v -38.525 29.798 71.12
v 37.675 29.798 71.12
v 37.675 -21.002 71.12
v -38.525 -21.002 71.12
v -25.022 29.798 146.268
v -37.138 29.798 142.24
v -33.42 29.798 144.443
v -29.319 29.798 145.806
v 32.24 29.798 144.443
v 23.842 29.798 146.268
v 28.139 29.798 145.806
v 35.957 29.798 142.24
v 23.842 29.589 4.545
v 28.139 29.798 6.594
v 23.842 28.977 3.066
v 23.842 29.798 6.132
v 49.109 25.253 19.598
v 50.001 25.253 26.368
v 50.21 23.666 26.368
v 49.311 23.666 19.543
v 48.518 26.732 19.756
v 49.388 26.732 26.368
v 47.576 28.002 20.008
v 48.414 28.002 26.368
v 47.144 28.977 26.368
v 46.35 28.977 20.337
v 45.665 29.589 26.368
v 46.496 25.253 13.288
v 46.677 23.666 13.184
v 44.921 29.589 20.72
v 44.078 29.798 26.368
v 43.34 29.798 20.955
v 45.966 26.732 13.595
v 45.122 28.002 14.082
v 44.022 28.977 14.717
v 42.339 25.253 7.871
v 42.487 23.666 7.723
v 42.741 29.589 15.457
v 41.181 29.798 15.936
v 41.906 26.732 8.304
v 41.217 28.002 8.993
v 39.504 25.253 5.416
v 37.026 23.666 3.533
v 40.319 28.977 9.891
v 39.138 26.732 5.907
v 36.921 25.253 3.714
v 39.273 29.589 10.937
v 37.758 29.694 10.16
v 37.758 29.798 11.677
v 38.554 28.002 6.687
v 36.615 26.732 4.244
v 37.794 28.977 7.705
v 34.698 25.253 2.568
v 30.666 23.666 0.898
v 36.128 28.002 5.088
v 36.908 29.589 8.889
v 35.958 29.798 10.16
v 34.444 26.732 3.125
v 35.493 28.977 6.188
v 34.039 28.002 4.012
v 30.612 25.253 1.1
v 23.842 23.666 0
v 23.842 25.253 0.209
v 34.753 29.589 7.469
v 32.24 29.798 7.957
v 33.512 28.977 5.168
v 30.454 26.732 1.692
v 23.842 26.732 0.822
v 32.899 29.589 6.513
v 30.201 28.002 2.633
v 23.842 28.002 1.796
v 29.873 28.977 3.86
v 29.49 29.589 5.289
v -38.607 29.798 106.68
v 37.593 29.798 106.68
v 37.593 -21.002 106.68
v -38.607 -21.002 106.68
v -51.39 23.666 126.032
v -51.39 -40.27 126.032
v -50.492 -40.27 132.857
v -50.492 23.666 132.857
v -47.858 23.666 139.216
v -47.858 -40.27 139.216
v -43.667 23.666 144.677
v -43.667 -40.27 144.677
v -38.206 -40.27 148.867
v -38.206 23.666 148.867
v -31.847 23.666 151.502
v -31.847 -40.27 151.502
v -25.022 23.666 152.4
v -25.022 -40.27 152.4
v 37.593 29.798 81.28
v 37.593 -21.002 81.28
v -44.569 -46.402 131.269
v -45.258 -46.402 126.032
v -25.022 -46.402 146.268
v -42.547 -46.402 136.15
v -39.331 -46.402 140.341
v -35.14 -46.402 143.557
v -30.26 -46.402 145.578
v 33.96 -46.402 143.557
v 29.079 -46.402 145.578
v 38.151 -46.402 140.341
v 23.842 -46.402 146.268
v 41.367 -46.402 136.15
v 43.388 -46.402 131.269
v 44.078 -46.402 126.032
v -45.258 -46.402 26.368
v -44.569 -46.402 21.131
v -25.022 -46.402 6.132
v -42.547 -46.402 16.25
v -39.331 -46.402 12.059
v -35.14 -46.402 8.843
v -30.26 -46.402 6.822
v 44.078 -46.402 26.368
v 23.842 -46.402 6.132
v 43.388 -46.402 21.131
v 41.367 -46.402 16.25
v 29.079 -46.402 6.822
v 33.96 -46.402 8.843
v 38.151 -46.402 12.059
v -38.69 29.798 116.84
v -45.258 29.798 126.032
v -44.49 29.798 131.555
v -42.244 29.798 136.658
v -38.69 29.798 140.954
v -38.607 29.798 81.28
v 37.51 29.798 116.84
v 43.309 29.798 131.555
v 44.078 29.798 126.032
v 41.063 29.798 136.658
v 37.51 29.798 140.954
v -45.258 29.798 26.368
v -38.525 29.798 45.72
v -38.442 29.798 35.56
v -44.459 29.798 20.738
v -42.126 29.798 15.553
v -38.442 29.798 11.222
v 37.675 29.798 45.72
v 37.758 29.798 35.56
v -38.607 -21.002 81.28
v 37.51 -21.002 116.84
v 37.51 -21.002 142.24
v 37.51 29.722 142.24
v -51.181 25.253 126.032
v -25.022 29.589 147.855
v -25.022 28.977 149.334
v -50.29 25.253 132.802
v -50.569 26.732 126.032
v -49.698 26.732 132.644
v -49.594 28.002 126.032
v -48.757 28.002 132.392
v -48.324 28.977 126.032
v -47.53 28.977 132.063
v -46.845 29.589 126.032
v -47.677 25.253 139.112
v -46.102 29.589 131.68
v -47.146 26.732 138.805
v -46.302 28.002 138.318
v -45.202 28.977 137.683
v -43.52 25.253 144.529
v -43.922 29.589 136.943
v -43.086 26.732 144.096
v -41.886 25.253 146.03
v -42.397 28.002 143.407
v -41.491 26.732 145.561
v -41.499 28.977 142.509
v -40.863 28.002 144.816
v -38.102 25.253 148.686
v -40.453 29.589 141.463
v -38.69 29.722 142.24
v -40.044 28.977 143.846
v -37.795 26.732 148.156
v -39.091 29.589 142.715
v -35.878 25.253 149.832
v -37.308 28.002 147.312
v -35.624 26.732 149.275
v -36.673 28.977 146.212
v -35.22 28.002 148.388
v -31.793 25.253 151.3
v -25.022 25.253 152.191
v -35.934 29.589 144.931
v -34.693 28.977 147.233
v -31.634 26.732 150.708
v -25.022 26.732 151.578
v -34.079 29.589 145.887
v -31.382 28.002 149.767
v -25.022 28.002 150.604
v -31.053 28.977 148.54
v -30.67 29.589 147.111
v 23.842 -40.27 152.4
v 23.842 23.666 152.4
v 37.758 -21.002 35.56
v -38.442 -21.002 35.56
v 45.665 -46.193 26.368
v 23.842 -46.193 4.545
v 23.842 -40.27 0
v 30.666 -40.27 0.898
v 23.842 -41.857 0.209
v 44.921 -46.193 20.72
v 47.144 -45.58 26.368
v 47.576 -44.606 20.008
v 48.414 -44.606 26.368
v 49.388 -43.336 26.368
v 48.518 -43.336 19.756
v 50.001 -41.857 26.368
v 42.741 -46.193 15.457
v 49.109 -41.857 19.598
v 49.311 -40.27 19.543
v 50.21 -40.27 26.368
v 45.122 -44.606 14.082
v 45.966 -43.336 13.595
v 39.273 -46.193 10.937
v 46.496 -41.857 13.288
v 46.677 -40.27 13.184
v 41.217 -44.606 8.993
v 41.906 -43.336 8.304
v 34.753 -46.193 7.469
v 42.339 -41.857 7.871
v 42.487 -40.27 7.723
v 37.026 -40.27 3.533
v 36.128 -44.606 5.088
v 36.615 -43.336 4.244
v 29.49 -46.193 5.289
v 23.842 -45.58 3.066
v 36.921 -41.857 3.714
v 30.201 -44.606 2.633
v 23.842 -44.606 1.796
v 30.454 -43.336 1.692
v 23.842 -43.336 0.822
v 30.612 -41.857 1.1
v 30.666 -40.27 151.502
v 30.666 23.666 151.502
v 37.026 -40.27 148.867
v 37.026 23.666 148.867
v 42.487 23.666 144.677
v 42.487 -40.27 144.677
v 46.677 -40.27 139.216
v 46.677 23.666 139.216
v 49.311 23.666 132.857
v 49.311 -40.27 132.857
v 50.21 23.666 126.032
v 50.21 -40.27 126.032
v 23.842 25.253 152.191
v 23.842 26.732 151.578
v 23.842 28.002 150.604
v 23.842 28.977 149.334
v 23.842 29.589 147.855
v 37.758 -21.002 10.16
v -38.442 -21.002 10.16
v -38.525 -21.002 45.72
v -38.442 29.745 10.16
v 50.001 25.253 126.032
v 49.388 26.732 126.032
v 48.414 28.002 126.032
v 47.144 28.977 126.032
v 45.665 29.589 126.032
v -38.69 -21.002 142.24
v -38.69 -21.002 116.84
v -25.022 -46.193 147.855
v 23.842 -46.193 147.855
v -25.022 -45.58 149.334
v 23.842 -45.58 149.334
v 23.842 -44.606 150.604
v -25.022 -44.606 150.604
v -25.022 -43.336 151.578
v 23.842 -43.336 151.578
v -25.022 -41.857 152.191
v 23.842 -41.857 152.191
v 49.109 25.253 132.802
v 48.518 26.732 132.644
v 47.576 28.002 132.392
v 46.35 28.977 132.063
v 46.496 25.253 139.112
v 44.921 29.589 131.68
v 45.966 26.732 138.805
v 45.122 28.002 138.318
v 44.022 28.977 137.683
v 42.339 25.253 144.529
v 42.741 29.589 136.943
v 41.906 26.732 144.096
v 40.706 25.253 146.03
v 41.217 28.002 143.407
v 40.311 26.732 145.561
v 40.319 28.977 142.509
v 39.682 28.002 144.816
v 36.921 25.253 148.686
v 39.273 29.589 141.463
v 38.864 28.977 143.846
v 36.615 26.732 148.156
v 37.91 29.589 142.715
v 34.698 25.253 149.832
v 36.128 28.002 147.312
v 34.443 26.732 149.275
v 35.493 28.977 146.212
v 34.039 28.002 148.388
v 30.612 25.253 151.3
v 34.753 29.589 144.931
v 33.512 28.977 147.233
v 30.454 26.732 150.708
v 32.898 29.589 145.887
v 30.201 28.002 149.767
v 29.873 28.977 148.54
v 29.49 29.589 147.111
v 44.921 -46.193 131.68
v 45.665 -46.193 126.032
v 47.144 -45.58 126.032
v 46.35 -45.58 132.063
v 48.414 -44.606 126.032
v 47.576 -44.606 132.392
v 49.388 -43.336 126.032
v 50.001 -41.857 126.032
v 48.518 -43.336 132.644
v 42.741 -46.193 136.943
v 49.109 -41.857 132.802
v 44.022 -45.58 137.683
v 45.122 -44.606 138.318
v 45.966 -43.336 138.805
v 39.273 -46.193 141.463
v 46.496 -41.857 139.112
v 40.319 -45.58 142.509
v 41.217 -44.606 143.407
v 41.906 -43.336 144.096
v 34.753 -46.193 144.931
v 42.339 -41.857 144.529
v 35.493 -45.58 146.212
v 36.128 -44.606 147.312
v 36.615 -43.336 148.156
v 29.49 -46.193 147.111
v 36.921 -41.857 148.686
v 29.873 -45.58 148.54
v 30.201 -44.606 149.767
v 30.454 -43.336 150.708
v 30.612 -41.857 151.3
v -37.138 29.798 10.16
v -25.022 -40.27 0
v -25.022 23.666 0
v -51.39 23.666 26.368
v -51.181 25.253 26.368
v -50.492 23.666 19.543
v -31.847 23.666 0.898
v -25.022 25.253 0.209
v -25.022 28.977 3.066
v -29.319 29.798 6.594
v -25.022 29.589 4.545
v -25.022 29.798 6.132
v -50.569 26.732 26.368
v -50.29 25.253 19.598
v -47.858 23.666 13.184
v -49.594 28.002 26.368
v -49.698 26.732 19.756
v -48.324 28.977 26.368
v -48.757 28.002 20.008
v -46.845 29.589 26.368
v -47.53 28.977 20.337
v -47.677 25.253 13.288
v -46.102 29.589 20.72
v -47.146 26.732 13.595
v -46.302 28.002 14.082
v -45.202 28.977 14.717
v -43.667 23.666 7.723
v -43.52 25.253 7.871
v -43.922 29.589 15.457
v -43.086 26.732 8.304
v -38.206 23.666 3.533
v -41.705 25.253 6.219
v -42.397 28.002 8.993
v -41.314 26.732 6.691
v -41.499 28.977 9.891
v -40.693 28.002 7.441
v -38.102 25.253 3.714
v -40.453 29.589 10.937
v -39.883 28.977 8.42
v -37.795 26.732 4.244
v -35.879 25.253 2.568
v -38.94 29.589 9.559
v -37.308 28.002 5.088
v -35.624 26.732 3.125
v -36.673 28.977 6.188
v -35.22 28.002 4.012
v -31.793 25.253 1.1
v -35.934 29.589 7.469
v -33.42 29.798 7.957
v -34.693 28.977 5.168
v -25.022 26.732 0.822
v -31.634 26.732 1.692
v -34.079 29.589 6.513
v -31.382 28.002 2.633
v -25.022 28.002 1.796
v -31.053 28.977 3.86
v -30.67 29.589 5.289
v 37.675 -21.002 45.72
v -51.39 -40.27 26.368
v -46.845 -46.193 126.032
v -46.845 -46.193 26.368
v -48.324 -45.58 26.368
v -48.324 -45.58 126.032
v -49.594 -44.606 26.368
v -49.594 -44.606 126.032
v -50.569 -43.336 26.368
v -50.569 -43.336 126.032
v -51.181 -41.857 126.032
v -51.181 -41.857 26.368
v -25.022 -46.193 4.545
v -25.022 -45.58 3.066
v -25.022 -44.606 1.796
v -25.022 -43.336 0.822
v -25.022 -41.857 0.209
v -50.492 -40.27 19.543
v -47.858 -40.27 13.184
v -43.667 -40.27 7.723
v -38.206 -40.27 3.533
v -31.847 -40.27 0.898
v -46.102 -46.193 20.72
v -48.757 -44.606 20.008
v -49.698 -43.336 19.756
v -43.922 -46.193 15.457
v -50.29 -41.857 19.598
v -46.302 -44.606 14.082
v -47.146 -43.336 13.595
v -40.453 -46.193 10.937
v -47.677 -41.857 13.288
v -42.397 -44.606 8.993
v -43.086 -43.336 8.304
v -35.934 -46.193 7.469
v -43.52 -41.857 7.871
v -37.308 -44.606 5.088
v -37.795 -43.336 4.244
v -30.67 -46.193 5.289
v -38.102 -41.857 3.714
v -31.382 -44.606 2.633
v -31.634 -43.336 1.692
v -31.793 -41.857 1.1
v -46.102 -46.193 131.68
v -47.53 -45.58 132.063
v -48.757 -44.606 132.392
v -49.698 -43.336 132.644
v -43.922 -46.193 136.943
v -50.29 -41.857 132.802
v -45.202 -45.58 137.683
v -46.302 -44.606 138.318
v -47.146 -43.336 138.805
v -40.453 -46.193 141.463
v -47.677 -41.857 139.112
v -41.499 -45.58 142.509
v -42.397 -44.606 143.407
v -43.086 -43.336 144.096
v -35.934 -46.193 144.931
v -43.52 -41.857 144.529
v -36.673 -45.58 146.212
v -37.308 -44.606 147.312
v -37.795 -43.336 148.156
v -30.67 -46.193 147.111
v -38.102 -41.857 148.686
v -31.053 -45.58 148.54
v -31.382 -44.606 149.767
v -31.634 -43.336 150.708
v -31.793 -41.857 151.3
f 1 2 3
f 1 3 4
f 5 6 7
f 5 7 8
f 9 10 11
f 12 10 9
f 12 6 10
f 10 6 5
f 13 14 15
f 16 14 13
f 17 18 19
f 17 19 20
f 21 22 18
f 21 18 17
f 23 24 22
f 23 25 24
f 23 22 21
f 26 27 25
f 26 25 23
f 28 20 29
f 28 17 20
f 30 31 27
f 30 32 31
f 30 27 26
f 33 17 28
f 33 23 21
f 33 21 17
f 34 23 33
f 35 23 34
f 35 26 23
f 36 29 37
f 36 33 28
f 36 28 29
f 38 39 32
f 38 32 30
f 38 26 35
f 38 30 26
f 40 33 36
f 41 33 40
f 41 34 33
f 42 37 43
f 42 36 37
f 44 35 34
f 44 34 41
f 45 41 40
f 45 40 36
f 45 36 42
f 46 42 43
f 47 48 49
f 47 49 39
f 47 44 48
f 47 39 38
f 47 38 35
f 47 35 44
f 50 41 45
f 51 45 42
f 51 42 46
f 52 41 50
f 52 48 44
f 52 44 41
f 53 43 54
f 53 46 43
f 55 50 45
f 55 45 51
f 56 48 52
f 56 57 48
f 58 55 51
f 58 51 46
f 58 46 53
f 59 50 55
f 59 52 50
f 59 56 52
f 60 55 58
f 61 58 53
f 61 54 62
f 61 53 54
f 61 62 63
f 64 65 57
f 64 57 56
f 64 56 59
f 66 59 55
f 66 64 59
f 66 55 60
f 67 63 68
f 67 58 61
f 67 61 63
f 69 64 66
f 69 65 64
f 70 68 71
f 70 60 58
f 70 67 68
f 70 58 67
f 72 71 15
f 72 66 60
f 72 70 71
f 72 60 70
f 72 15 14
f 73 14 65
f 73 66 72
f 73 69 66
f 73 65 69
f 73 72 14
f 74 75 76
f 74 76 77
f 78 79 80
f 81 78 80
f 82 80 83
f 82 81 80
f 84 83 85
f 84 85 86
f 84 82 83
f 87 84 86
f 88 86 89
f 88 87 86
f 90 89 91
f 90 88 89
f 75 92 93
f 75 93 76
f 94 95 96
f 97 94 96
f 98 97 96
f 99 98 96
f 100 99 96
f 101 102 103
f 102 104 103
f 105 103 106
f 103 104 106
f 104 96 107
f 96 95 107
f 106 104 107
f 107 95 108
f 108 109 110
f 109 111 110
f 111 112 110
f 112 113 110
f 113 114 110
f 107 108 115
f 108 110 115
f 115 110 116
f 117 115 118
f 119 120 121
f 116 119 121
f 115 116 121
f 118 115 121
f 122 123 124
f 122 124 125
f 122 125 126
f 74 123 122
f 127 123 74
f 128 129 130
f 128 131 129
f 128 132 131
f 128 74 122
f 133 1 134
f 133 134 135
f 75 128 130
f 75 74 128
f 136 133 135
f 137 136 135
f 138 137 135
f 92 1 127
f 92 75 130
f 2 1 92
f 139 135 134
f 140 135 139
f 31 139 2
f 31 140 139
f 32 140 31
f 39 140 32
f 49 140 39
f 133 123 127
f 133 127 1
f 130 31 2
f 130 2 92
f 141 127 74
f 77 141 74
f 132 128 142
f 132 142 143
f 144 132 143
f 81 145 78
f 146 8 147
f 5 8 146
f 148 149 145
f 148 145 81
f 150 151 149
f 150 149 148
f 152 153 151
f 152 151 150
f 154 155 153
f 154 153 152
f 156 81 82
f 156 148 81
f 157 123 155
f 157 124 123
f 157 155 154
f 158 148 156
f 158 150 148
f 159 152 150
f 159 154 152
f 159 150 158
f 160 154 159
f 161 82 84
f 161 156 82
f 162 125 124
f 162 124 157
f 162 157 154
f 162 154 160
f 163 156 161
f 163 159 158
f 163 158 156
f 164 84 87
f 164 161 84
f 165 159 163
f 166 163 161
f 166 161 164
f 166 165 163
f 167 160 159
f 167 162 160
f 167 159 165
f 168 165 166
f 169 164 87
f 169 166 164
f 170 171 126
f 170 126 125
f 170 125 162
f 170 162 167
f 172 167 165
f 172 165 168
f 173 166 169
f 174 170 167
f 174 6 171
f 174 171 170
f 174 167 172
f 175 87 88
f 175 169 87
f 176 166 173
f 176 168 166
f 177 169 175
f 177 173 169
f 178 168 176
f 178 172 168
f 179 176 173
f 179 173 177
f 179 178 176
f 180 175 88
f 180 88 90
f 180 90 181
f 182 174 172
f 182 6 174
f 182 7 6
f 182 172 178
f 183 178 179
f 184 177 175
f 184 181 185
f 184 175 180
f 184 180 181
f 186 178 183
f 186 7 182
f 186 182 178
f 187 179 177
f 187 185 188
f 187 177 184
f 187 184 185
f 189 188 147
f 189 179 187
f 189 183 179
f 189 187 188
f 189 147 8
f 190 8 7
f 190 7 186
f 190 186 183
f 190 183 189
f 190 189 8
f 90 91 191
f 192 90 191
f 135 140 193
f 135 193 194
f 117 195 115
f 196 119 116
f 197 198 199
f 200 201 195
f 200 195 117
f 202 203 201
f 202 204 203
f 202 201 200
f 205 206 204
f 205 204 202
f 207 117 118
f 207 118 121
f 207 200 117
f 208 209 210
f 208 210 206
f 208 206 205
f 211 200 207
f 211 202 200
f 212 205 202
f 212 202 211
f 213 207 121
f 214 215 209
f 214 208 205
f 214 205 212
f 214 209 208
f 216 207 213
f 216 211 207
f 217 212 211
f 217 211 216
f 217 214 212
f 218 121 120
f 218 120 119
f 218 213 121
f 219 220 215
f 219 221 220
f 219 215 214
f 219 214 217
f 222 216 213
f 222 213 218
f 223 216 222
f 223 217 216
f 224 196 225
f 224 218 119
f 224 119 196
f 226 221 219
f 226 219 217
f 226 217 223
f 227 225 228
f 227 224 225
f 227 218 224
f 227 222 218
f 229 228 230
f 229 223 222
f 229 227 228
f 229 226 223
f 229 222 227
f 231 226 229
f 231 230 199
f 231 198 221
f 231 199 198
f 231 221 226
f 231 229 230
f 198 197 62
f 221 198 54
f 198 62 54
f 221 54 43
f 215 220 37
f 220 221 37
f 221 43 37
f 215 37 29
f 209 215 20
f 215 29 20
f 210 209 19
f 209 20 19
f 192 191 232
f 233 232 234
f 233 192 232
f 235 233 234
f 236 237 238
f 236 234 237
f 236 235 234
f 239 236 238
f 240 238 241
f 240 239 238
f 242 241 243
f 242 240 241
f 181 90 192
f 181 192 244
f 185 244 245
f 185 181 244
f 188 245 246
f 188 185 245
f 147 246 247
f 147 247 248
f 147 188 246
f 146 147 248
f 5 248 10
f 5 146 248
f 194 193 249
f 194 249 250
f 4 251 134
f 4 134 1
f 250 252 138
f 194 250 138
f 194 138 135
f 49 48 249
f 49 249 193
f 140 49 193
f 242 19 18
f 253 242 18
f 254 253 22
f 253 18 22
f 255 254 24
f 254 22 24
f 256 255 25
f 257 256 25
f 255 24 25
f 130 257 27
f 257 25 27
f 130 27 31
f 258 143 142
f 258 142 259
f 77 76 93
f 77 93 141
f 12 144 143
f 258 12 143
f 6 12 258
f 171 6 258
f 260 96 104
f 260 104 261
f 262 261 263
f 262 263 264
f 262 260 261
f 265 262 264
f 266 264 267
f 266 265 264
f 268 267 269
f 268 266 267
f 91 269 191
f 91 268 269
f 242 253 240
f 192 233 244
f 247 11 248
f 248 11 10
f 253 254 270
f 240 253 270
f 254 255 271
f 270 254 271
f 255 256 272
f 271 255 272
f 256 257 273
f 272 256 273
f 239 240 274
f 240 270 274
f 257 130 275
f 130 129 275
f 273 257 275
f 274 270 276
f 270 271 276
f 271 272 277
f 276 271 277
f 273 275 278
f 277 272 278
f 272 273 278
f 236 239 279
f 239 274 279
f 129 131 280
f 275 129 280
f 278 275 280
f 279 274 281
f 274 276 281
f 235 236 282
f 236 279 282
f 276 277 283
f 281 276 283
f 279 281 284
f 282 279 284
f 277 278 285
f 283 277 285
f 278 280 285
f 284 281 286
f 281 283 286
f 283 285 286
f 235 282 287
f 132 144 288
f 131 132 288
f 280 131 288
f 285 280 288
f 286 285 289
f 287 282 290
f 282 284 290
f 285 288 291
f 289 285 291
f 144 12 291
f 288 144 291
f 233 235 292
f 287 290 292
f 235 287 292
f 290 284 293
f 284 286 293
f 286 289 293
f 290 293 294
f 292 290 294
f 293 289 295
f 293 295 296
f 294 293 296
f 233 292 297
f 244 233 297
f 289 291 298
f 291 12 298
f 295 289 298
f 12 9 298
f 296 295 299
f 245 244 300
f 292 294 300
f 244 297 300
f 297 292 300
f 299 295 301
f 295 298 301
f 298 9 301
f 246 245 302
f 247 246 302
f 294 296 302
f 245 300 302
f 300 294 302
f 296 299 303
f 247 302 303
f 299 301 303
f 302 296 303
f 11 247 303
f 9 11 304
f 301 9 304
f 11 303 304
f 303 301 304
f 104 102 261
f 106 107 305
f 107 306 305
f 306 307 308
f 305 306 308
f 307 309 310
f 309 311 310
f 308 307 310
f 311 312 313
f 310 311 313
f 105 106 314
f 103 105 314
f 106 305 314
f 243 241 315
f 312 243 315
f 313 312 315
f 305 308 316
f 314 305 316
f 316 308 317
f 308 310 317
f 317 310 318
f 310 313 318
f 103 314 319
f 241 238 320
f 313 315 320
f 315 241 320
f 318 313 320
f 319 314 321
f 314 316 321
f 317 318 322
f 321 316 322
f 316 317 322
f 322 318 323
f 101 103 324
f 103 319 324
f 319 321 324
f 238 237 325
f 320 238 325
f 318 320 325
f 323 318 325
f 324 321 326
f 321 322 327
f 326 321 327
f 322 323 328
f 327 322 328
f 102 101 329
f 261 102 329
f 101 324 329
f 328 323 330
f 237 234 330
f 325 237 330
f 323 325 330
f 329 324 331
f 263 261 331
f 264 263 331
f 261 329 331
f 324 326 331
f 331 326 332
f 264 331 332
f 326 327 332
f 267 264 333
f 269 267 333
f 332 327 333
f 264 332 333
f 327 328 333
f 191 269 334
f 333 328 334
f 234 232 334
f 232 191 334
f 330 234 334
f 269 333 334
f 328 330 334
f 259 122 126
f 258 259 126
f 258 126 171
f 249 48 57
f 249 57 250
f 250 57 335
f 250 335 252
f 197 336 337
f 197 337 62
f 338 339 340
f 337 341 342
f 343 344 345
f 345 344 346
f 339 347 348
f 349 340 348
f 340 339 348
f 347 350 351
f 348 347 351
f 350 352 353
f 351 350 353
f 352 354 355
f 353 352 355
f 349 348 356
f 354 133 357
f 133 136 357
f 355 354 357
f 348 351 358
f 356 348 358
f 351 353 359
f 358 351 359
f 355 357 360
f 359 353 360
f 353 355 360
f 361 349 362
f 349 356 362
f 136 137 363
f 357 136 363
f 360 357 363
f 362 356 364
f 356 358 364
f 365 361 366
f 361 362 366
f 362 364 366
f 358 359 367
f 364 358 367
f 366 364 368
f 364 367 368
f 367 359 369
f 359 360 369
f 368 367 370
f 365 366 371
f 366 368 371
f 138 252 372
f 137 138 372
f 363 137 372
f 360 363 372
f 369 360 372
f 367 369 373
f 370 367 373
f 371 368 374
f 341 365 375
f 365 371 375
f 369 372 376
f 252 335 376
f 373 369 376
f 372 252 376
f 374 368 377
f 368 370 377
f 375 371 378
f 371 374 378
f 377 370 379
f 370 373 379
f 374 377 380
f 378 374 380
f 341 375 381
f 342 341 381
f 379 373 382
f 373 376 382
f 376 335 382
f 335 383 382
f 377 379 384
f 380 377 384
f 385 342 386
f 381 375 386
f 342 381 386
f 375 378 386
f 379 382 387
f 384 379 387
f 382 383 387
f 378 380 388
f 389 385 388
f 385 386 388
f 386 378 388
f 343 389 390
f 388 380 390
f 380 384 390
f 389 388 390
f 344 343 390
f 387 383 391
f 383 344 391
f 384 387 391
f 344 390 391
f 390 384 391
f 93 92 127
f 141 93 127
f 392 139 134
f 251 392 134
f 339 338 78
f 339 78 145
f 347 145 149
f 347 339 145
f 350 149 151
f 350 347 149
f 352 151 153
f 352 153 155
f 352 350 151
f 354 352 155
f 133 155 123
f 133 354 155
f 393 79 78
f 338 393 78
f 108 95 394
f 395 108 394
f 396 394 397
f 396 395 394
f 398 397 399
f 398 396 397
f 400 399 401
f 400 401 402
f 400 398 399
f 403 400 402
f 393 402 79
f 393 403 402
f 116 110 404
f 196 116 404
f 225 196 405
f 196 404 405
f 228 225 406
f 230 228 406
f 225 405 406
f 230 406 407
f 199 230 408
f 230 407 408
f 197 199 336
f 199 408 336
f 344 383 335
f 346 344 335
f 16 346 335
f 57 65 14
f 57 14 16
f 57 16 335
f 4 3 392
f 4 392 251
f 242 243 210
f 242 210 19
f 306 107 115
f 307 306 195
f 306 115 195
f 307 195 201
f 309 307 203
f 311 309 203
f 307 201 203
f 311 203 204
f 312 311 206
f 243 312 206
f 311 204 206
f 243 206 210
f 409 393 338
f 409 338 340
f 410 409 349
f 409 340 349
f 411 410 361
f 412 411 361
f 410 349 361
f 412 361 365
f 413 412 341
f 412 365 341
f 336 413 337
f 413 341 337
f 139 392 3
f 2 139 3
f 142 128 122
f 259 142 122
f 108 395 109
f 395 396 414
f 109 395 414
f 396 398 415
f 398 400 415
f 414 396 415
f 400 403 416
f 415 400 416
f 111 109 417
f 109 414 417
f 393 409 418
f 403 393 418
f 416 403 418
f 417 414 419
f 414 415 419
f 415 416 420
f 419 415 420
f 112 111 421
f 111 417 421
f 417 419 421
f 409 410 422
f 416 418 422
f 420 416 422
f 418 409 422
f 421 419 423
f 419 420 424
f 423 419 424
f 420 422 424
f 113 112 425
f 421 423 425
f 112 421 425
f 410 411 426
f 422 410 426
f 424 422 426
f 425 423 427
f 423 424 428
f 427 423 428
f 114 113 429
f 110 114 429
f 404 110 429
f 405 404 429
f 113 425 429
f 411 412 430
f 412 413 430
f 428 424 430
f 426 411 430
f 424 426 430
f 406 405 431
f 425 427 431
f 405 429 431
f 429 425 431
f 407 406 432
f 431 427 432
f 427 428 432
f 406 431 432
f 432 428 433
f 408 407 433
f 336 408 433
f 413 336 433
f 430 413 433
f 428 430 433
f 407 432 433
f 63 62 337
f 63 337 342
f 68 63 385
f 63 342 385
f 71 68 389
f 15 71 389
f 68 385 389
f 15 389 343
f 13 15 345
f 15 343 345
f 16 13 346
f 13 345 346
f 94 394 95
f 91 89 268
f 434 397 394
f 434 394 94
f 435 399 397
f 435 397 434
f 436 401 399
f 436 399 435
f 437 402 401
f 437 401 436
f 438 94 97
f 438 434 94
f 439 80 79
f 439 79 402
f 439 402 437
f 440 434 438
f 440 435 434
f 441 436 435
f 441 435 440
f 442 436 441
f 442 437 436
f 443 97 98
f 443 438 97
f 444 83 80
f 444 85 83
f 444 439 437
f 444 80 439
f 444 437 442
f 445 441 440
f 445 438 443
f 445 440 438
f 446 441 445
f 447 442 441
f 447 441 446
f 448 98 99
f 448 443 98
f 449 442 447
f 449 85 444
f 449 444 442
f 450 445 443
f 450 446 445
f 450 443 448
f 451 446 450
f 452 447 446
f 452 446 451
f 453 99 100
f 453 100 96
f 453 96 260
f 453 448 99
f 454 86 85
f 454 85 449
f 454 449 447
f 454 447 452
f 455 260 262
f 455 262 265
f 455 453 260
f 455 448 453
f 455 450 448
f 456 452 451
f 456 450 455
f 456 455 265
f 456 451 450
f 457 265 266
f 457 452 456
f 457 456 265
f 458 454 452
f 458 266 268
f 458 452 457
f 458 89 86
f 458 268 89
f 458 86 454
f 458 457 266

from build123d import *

# Parameters (mm, degrees)
F0_W         = 101.6
F0_H         = 76.2
F1_DEPTH     = 152.4
F2_W         = 76.2
F2_H         = 25.4
F3_DEPTH     = 50.8
F4_R         = 26.3680405282
F5_T1_DEPTH  = 48.8639189435
F5_T3_DEPTH  = 99.6639189435
F5_T6_ANGLE  = 90
F5_T8_ANGLE  = 90
F5_T10_ANGLE = 90
F5_T12_ANGLE = 90
F5_T14_ANGLE = 90
F5_T16_ANGLE = 90
F5_T18_ANGLE = 90
F5_T20_ANGLE = 90


# Not quite as in the source:
# - a fillet or chamfer that OpenCascade refuses, or shapes differently, is made with other operations: its cross-section is extruded or revolved along the edge and cut away or added


with BuildPart() as f1:
    # F0 (on Top) → F1 (new body)
    with BuildSketch(Plane.XY):
        with Locations((-0.5902759731, -8.3016921655)):
            Rectangle(F0_W, F0_H)
    extrude(amount=F1_DEPTH)

    # F2 (on face) → F3 (cut)
    with BuildSketch(Plane(origin=(0, 29.7983078345, 0), x_dir=(-1, 0, 0), z_dir=(0, 1, 0))):
        with Locations((0.5902759731, 129.54)):
            Rectangle(F2_W, F2_H)
        with Locations((0.5074083115, 93.9800965559)):
            Rectangle(F2_W, F2_H)
        with Locations((0.42454065, 58.4201931119)):
            Rectangle(F2_W, F2_H)
        with Locations((0.3416729884, 22.8602896678)):
            Rectangle(F2_W, F2_H)
    extrude(amount=-F3_DEPTH, mode=Mode.SUBTRACT)

    # F4
    f4_edges = [f1.edges().sort_by_distance(p)[0] for p in [
        (-51.390276, -8.301692, 152.4),
        (50.209724, -8.301692, 152.4),
        (-51.390276, -8.301692, 0),
        (50.209724, -8.301692, 0),
    ]]
    fillet(f4_edges, radius=F4_R)

    # F5: fillet of radius 6.1321024484 on 16 edges, made by hand

    # F5_s2 → F5_t1 (cut)
    with BuildSketch(Plane.YZ.offset(-25.0222354448)):
        with BuildLine():
            ThreePointArc((23.6662053861, 152.4), (28.0022566103, 150.6039487758), (29.7983078345, 146.2678975516))
            Line((29.7983078345, 146.2678975516), (29.7983078345, 152.4))
            Line((29.7983078345, 152.4), (23.6662053861, 152.4))
        make_face()
        with BuildLine():
            ThreePointArc((-46.4016921655, 146.2678975516), (-44.6056409413, 150.6039487758), (-40.2695897171, 152.4))
            Line((-40.2695897171, 152.4), (-46.4016921655, 152.4))
            Line((-46.4016921655, 152.4), (-46.4016921655, 146.2678975516))
        make_face()
        with BuildLine():
            ThreePointArc((23.6662053861, 0), (28.0022566103, 1.7960512242), (29.7983078345, 6.1321024484))
            Line((29.7983078345, 6.1321024484), (29.7983078345, 0))
            Line((29.7983078345, 0), (23.6662053861, 0))
        make_face()
        with BuildLine():
            ThreePointArc((-46.4016921655, 6.1321024484), (-44.6056409413, 1.7960512242), (-40.2695897171, 0))
            Line((-40.2695897171, 0), (-46.4016921655, 0))
            Line((-46.4016921655, 0), (-46.4016921655, 6.1321024484))
        make_face()
    extrude(amount=F5_T1_DEPTH, mode=Mode.SUBTRACT)

    # F5_s4 → F5_t3 (cut)
    with BuildSketch(Plane.XY.offset(26.3680405282)):
        with BuildLine():
            ThreePointArc((-45.2581735247, -46.4016921655), (-49.5942247489, -44.6056409413), (-51.3902759731, -40.2695897171))
            Line((-51.3902759731, -40.2695897171), (-51.3902759731, -46.4016921655))
            Line((-51.3902759731, -46.4016921655), (-45.2581735247, -46.4016921655))
        make_face()
        with BuildLine():
            ThreePointArc((44.0776215785, -46.4016921655), (48.4136728027, -44.6056409413), (50.2097240269, -40.2695897171))
            Line((50.2097240269, -40.2695897171), (50.2097240269, -46.4016921655))
            Line((50.2097240269, -46.4016921655), (44.0776215785, -46.4016921655))
        make_face()
        with BuildLine():
            ThreePointArc((-51.3902759731, 23.6662053861), (-49.5942247489, 28.0022566103), (-45.2581735247, 29.7983078345))
            Line((-45.2581735247, 29.7983078345), (-51.3902759731, 29.7983078345))
            Line((-51.3902759731, 29.7983078345), (-51.3902759731, 23.6662053861))
        make_face()
        with BuildLine():
            ThreePointArc((50.2097240269, 23.6662053861), (48.4136728027, 28.0022566103), (44.0776215785, 29.7983078345))
            Line((44.0776215785, 29.7983078345), (50.2097240269, 29.7983078345))
            Line((50.2097240269, 29.7983078345), (50.2097240269, 23.6662053861))
        make_face()
    extrude(amount=F5_T3_DEPTH, mode=Mode.SUBTRACT)

    # F5_s5 → F5_t6 (revolve, cut)
    with BuildSketch(Plane.XY.offset(26.3680405282)):
        with BuildLine():
            ThreePointArc((-45.2581735247, -46.4016921655), (-49.5942247489, -44.6056409413), (-51.3902759731, -40.2695897171))
            Line((-51.3902759731, -40.2695897171), (-51.3902759731, -46.4016921655))
            Line((-51.3902759731, -46.4016921655), (-45.2581735247, -46.4016921655))
        make_face()
    revolve(axis=Axis((-25.0222354448, -46.4016921655, 26.3680405282), (0, -1, 0)), revolution_arc=F5_T6_ANGLE, mode=Mode.SUBTRACT)

    # F5_s7 → F5_t8 (revolve, cut)
    with BuildSketch(Plane.XY.offset(126.0319594718)):
        with BuildLine():
            ThreePointArc((-45.2581735247, -46.4016921655), (-49.5942247489, -44.6056409413), (-51.3902759731, -40.2695897171))
            Line((-51.3902759731, -40.2695897171), (-51.3902759731, -46.4016921655))
            Line((-51.3902759731, -46.4016921655), (-45.2581735247, -46.4016921655))
        make_face()
    revolve(axis=Axis((-25.0222354448, -46.4016921655, 126.0319594718), (0, 1, 0)), revolution_arc=F5_T8_ANGLE, mode=Mode.SUBTRACT)

    # F5_s9 → F5_t10 (revolve, cut)
    with BuildSketch(Plane.XY.offset(26.3680405282)):
        with BuildLine():
            ThreePointArc((44.0776215785, -46.4016921655), (48.4136728027, -44.6056409413), (50.2097240269, -40.2695897171))
            Line((50.2097240269, -40.2695897171), (50.2097240269, -46.4016921655))
            Line((50.2097240269, -46.4016921655), (44.0776215785, -46.4016921655))
        make_face()
    revolve(axis=Axis((23.8416834987, -46.4016921655, 26.3680405282), (0, 1, 0)), revolution_arc=F5_T10_ANGLE, mode=Mode.SUBTRACT)

    # F5_s11 → F5_t12 (revolve, cut)
    with BuildSketch(Plane.XY.offset(126.0319594718)):
        with BuildLine():
            ThreePointArc((44.0776215785, -46.4016921655), (48.4136728027, -44.6056409413), (50.2097240269, -40.2695897171))
            Line((50.2097240269, -40.2695897171), (50.2097240269, -46.4016921655))
            Line((50.2097240269, -46.4016921655), (44.0776215785, -46.4016921655))
        make_face()
    revolve(axis=Axis((23.8416834987, -46.4016921655, 126.0319594718), (0, -1, 0)), revolution_arc=F5_T12_ANGLE, mode=Mode.SUBTRACT)

    # F5_s13 → F5_t14 (revolve, cut)
    with BuildSketch(Plane.XY.offset(26.3680405282)):
        with BuildLine():
            ThreePointArc((-51.3902759731, 23.6662053861), (-49.5942247489, 28.0022566103), (-45.2581735247, 29.7983078345))
            Line((-45.2581735247, 29.7983078345), (-51.3902759731, 29.7983078345))
            Line((-51.3902759731, 29.7983078345), (-51.3902759731, 23.6662053861))
        make_face()
    revolve(axis=Axis((-25.0222354448, 29.7983078345, 26.3680405282), (0, -1, 0)), revolution_arc=F5_T14_ANGLE, mode=Mode.SUBTRACT)

    # F5_s15 → F5_t16 (revolve, cut)
    with BuildSketch(Plane.XY.offset(126.0319594718)):
        with BuildLine():
            ThreePointArc((-51.3902759731, 23.6662053861), (-49.5942247489, 28.0022566103), (-45.2581735247, 29.7983078345))
            Line((-45.2581735247, 29.7983078345), (-51.3902759731, 29.7983078345))
            Line((-51.3902759731, 29.7983078345), (-51.3902759731, 23.6662053861))
        make_face()
    revolve(axis=Axis((-25.0222354448, 29.7983078345, 126.0319594718), (0, 1, 0)), revolution_arc=F5_T16_ANGLE, mode=Mode.SUBTRACT)

    # F5_s17 → F5_t18 (revolve, cut)
    with BuildSketch(Plane.XY.offset(26.3680405282)):
        with BuildLine():
            ThreePointArc((50.2097240269, 23.6662053861), (48.4136728027, 28.0022566103), (44.0776215785, 29.7983078345))
            Line((44.0776215785, 29.7983078345), (50.2097240269, 29.7983078345))
            Line((50.2097240269, 29.7983078345), (50.2097240269, 23.6662053861))
        make_face()
    revolve(axis=Axis((23.8416834987, 29.7983078345, 26.3680405282), (0, 1, 0)), revolution_arc=F5_T18_ANGLE, mode=Mode.SUBTRACT)

    # F5_s19 → F5_t20 (revolve, cut)
    with BuildSketch(Plane.XY.offset(126.0319594718)):
        with BuildLine():
            ThreePointArc((50.2097240269, 23.6662053861), (48.4136728027, 28.0022566103), (44.0776215785, 29.7983078345))
            Line((44.0776215785, 29.7983078345), (50.2097240269, 29.7983078345))
            Line((50.2097240269, 29.7983078345), (50.2097240269, 23.6662053861))
        make_face()
    revolve(axis=Axis((23.8416834987, 29.7983078345, 126.0319594718), (0, -1, 0)), revolution_arc=F5_T20_ANGLE, mode=Mode.SUBTRACT)


solid = f1.part
